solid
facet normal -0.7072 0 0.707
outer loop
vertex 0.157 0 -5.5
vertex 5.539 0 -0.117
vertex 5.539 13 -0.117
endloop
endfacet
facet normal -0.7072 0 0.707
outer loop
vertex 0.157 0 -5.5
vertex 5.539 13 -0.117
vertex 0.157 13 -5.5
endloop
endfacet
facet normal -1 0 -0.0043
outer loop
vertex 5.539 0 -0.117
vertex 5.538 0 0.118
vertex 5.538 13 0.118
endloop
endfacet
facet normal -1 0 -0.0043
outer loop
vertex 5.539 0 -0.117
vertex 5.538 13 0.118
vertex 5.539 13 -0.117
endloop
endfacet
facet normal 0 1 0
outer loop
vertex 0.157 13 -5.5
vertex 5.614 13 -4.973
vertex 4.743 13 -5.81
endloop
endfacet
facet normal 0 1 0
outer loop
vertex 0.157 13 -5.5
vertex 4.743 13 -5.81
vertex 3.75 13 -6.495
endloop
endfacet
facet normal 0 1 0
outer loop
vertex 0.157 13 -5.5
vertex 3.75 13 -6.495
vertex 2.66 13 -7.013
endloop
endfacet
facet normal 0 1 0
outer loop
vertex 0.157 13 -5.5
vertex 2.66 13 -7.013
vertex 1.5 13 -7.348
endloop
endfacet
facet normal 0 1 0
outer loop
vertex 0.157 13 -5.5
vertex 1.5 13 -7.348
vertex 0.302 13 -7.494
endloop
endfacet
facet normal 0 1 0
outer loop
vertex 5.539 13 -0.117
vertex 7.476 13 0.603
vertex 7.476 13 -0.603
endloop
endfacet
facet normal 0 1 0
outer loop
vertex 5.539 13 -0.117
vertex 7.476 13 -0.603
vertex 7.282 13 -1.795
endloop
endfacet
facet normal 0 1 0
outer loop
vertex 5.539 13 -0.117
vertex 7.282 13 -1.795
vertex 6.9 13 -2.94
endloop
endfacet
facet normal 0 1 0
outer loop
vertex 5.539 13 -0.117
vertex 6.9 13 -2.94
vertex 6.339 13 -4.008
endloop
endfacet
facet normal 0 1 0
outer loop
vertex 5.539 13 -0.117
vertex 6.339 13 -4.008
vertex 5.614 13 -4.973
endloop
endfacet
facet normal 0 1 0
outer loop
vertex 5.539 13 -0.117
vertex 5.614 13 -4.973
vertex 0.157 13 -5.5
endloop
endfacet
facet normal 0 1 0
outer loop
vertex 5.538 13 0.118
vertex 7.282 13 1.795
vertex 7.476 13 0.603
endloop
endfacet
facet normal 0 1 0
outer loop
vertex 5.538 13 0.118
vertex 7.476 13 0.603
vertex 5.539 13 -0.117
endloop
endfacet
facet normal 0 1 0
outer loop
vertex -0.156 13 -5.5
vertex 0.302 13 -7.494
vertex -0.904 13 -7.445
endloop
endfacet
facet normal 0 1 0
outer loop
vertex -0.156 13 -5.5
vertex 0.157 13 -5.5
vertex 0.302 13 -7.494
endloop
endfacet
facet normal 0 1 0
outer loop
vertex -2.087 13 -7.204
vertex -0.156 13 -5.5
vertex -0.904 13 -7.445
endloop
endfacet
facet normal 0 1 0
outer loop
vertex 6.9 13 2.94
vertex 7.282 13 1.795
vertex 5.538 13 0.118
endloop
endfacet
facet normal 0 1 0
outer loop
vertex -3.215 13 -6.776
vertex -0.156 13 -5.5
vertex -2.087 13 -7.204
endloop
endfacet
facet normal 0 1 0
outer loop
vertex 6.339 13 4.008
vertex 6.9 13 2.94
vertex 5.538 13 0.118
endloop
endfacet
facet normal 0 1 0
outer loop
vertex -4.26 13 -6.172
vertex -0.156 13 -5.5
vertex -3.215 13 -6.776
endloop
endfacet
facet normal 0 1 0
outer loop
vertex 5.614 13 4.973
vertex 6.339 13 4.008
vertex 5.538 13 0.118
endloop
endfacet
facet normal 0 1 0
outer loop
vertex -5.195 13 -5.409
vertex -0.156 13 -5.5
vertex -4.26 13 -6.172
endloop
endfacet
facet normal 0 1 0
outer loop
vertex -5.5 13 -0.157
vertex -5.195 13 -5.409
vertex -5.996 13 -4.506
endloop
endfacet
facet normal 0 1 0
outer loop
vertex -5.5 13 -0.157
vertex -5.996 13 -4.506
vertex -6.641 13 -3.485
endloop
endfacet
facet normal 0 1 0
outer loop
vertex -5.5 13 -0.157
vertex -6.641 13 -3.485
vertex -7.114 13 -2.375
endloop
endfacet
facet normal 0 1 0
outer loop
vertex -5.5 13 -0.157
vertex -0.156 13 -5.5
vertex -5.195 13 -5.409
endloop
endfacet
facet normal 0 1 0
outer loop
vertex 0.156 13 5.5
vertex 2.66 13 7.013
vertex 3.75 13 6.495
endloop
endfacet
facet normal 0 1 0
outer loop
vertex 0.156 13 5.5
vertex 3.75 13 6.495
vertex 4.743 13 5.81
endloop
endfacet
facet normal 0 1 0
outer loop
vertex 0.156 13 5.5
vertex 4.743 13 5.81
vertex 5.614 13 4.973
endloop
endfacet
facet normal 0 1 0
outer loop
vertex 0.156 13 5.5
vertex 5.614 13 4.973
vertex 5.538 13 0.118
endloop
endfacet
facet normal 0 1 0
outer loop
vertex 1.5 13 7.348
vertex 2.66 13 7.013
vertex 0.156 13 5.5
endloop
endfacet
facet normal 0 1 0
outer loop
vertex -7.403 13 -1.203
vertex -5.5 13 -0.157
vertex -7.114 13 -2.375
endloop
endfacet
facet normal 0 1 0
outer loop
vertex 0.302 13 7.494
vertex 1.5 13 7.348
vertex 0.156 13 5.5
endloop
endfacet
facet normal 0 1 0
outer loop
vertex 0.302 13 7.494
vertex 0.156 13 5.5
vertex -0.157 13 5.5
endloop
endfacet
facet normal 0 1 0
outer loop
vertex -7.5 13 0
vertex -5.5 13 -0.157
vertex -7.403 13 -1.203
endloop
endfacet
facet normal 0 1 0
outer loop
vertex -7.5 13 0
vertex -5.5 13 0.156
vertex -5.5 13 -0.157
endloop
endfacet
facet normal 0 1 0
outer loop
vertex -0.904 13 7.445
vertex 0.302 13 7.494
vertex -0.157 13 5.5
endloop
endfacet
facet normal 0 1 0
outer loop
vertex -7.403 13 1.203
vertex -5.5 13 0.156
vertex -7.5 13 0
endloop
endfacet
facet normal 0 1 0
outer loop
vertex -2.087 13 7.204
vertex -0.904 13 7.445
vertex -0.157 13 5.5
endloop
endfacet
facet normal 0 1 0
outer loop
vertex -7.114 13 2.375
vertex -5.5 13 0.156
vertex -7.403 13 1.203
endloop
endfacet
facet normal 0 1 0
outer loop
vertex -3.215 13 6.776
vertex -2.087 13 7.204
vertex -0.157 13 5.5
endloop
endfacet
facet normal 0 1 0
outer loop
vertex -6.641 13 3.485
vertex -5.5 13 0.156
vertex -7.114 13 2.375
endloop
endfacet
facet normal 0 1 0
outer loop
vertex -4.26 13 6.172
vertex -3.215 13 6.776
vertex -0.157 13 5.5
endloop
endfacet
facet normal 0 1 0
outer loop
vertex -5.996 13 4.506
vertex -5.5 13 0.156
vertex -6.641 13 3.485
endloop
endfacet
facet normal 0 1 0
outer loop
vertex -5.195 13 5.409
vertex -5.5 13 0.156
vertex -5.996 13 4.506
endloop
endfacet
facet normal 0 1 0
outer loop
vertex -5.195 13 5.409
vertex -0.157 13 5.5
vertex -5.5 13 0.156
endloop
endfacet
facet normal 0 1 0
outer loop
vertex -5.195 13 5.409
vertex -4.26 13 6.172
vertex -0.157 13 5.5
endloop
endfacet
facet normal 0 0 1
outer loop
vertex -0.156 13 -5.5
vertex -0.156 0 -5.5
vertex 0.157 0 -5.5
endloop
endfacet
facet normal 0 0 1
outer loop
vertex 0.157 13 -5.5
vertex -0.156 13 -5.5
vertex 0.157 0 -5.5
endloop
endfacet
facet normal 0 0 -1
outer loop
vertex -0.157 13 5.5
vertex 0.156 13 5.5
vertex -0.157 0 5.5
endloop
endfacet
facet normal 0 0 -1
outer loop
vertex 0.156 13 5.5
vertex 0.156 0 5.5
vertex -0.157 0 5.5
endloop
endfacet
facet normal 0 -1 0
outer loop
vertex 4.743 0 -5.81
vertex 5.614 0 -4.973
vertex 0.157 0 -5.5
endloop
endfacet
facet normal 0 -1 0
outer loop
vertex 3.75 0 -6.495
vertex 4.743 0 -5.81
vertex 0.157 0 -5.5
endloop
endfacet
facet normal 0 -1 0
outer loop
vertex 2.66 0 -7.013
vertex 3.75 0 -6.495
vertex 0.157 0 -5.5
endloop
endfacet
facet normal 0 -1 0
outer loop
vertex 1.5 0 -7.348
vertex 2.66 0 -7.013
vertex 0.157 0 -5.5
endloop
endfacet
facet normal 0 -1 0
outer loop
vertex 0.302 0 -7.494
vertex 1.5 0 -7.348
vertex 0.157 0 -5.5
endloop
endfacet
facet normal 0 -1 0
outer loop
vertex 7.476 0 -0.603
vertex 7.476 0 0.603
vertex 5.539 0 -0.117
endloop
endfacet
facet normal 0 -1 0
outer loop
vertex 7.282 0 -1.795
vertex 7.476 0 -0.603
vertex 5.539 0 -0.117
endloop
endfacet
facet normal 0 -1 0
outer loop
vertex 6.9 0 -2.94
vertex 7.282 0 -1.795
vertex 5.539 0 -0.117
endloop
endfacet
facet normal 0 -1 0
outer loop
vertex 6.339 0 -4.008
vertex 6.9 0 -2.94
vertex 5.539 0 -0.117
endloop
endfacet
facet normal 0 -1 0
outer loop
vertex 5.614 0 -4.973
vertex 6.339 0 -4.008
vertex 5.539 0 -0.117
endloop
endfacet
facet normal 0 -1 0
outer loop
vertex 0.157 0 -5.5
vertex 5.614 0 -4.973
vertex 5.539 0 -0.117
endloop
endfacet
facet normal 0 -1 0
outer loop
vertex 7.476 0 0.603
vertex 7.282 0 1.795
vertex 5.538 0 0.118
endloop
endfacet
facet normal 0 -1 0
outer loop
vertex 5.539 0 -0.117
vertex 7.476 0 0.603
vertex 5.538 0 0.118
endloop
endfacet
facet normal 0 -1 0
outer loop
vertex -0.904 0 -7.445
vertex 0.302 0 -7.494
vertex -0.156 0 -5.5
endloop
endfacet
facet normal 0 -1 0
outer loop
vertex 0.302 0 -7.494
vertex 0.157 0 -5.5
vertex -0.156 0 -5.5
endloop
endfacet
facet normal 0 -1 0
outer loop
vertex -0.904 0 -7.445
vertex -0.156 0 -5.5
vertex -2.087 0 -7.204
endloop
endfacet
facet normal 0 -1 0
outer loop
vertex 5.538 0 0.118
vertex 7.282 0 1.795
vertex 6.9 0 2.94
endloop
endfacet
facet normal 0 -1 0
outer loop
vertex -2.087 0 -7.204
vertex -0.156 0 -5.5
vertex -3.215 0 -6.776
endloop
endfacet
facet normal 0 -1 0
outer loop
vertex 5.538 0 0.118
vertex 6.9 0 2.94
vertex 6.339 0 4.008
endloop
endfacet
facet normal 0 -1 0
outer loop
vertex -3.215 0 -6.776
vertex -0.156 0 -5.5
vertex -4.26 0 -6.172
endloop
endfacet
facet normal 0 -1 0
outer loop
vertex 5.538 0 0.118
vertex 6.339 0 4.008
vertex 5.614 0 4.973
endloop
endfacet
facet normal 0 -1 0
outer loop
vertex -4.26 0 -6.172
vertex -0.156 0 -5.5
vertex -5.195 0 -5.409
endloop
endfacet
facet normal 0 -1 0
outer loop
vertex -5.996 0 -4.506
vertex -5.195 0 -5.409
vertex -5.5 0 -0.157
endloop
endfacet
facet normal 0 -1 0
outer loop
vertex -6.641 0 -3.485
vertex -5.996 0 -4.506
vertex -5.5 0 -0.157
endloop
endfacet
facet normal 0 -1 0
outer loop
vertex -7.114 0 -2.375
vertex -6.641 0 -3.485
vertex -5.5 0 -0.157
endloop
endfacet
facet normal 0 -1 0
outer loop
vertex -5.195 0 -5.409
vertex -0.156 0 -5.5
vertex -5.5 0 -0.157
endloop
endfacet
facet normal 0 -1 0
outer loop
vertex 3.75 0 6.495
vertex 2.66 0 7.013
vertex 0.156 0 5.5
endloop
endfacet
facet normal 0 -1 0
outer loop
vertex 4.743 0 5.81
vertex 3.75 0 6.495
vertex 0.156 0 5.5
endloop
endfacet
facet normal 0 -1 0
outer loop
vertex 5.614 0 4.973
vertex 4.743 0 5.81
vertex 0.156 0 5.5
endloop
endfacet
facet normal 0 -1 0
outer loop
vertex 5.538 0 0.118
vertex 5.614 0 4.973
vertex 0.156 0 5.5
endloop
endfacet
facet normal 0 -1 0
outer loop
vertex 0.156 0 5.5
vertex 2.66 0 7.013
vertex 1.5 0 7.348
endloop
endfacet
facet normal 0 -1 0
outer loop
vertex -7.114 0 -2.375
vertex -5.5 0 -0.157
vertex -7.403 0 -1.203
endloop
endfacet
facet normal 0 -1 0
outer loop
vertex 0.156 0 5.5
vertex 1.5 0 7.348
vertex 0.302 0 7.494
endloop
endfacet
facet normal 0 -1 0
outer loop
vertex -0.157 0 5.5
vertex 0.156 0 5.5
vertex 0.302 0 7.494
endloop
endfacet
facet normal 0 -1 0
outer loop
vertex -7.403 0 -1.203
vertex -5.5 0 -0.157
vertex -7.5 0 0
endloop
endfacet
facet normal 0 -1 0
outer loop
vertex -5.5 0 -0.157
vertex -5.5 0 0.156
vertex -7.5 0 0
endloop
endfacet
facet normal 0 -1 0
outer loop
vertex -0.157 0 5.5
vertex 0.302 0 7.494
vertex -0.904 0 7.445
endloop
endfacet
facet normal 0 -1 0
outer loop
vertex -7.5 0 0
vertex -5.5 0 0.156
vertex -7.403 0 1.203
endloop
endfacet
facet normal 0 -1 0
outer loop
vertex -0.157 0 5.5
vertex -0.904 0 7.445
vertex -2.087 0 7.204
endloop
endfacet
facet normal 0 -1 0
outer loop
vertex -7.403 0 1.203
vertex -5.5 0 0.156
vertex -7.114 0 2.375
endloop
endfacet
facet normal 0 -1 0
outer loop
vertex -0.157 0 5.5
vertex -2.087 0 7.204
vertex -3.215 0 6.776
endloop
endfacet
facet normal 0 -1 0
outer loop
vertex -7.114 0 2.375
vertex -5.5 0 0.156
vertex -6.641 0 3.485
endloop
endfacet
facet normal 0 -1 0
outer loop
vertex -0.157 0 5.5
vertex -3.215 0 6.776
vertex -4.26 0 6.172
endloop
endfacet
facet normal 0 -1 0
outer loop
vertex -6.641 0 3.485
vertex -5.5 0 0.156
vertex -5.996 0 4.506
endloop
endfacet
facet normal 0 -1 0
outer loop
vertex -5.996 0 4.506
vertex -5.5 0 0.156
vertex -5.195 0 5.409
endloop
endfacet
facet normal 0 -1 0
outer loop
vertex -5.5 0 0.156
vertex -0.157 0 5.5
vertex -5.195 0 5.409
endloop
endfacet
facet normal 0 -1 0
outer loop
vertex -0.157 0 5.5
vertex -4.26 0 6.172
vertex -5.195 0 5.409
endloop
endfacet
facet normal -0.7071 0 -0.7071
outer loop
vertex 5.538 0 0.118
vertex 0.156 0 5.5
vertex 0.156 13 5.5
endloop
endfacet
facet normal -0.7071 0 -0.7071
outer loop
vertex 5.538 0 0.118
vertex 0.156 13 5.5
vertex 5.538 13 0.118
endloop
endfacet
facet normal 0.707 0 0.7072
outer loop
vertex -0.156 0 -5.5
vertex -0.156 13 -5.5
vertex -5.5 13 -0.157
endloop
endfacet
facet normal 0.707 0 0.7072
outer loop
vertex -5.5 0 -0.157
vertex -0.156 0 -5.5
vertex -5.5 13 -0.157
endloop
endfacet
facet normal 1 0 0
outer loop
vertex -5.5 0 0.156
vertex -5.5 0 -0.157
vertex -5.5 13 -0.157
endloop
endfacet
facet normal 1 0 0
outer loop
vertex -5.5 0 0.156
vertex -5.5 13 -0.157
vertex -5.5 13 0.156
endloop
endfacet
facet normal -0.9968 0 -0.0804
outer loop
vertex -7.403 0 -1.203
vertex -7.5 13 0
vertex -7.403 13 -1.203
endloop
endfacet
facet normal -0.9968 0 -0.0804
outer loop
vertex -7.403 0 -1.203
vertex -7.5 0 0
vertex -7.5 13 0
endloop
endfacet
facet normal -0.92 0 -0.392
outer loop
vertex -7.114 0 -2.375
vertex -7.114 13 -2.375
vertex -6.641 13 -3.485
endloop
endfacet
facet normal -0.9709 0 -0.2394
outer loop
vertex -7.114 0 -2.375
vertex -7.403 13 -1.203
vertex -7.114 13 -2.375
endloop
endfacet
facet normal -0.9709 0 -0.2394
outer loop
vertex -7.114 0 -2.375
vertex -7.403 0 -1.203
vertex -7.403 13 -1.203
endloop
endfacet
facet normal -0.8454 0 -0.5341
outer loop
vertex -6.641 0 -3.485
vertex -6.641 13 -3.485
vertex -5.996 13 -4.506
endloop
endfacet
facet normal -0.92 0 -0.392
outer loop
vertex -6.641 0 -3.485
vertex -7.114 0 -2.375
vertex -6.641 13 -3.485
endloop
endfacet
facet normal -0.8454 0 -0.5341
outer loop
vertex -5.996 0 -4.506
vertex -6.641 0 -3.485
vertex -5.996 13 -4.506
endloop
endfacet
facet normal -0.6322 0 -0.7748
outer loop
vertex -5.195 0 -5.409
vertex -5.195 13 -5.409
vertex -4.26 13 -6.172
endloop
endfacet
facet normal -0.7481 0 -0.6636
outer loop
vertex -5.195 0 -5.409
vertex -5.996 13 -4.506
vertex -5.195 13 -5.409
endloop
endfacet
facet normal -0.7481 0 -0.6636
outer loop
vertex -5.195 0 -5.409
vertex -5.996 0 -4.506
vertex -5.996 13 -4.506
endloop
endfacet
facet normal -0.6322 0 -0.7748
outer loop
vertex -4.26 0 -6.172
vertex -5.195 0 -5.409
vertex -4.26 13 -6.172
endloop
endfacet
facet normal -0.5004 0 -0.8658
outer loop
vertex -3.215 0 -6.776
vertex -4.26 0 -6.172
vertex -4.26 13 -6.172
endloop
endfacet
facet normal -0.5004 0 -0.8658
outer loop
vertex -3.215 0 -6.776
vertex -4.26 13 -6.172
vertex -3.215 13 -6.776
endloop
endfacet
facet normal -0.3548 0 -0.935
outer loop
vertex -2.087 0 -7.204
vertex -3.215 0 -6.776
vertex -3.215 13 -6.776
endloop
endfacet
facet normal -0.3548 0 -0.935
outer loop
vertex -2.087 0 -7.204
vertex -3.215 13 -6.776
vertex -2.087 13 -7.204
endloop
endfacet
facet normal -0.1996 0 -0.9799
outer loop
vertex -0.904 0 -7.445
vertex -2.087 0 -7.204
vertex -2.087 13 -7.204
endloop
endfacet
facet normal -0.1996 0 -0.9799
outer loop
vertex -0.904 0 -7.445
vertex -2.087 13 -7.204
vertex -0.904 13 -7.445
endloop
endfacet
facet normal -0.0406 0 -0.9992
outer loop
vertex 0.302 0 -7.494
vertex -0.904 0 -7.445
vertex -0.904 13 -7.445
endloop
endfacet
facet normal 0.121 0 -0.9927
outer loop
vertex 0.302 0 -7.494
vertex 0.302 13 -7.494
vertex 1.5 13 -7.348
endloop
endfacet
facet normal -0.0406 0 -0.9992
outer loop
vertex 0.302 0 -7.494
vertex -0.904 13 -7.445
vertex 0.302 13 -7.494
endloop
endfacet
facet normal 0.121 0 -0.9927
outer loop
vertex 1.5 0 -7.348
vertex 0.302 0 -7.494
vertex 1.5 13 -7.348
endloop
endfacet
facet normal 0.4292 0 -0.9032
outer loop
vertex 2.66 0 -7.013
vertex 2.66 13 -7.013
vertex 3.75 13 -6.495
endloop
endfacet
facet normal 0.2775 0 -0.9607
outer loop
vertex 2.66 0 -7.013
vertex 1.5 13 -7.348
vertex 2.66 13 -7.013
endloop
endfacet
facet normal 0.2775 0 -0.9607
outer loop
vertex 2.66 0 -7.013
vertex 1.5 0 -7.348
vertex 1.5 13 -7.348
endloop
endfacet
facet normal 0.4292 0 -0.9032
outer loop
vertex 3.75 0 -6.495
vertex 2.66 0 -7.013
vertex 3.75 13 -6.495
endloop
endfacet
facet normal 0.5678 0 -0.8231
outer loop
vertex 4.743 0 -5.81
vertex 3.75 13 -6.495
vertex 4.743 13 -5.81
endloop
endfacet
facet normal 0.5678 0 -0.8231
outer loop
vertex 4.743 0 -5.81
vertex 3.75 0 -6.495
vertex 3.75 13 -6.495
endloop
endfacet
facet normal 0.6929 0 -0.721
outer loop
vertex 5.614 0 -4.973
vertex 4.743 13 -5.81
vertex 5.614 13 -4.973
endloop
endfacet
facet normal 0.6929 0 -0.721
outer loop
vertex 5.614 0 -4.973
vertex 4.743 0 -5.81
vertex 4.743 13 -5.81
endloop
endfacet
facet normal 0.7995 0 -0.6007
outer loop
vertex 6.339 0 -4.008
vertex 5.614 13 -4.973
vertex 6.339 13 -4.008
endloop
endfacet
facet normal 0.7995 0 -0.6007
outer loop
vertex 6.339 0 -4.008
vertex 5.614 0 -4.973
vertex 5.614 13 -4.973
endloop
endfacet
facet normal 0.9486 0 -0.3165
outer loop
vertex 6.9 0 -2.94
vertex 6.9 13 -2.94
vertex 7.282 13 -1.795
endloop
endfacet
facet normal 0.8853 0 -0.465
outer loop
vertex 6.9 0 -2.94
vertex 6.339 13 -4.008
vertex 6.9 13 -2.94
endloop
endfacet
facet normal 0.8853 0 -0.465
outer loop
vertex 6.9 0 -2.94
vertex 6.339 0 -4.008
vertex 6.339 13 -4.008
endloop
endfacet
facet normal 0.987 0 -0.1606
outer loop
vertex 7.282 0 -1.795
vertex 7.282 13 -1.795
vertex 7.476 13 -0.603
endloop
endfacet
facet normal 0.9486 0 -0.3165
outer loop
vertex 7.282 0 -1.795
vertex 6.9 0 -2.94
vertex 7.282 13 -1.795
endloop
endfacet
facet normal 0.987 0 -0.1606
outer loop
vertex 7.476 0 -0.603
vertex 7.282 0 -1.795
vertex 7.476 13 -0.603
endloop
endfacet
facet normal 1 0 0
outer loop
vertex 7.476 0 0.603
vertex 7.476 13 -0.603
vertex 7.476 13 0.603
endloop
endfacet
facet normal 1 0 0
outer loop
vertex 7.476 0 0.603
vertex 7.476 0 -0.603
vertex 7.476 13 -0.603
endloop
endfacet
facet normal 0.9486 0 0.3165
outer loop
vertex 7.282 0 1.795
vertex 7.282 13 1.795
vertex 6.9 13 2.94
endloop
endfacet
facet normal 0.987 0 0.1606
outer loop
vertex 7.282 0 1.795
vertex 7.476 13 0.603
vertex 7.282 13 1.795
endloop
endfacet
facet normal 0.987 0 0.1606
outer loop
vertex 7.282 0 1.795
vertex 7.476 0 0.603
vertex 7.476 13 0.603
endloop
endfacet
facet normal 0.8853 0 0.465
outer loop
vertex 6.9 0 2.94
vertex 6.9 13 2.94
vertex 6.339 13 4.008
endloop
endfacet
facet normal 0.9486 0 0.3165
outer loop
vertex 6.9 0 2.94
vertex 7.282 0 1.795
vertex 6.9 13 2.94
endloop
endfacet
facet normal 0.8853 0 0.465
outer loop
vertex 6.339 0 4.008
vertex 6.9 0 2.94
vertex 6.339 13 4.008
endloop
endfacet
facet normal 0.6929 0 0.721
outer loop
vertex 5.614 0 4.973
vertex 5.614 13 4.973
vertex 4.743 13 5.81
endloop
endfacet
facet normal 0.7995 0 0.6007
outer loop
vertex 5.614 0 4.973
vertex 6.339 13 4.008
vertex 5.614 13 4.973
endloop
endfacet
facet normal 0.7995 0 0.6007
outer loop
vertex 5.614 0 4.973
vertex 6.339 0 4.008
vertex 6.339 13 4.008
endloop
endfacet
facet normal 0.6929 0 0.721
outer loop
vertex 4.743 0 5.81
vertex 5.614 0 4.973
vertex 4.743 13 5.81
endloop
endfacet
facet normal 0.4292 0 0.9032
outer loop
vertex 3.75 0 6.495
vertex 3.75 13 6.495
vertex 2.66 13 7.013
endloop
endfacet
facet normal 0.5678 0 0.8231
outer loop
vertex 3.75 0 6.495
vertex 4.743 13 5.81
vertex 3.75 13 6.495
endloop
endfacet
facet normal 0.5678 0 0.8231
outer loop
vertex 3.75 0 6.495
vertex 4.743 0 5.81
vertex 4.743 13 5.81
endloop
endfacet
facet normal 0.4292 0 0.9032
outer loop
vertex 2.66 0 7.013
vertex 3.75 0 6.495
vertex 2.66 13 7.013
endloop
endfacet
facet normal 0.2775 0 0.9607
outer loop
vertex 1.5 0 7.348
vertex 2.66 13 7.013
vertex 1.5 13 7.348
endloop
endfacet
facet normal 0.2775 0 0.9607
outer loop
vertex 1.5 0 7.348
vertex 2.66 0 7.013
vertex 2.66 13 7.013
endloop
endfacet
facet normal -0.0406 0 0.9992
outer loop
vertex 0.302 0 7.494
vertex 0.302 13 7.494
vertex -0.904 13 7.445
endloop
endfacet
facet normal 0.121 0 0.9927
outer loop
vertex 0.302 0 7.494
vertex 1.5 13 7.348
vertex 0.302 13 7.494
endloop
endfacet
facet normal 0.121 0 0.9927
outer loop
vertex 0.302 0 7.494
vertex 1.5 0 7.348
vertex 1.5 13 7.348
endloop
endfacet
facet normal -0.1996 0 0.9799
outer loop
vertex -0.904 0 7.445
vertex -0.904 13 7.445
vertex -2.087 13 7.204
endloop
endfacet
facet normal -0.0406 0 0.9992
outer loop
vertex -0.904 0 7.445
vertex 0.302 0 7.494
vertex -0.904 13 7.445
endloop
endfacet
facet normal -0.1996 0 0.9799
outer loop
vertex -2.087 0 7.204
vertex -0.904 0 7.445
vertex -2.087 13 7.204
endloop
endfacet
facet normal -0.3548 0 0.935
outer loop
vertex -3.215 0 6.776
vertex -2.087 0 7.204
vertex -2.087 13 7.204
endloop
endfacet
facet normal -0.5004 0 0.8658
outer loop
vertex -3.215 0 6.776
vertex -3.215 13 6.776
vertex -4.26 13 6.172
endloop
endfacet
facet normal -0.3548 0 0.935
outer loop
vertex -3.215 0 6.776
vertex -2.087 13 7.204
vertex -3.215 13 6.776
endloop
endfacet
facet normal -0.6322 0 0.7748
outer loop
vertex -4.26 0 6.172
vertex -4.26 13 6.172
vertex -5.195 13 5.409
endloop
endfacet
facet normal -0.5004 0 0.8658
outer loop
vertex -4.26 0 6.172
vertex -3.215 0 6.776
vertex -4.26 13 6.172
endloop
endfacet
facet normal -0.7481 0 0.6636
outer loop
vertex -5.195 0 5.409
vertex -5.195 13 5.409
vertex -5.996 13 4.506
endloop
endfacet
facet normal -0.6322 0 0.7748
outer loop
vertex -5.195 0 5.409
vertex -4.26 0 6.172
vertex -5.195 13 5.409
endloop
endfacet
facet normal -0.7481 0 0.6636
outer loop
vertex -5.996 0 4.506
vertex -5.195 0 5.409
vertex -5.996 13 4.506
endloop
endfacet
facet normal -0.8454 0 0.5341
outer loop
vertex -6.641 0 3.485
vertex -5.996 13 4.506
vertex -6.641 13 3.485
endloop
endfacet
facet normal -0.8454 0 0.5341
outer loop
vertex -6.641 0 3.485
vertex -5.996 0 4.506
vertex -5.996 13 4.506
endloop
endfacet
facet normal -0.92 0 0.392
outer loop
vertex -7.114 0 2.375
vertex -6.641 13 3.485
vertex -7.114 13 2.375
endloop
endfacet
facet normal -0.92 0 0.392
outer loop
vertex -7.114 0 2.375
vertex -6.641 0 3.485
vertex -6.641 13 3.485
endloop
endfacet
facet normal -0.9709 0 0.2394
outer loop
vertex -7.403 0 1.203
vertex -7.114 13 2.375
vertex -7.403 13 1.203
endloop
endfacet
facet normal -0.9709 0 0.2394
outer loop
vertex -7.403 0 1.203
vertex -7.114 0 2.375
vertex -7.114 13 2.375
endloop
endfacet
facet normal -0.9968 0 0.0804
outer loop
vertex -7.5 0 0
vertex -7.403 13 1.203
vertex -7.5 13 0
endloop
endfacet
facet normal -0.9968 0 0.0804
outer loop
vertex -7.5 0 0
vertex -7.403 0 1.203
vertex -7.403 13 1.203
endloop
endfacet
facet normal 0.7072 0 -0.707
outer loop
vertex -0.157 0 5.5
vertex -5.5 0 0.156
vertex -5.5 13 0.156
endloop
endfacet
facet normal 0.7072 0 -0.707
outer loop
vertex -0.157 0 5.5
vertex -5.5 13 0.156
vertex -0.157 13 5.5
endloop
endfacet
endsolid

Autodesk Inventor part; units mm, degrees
ref_plane "YZ Plane" through (0, 0, 0) normal (1, 0, 0) x (0, 1, 0)
ref_plane "XZ Plane" through (0, 0, 0) normal (0, 1, 0) x (-1, 0, 0)
ref_plane "XY Plane" through (0, 0, 0) normal (0, 0, 1) x (1, 0, 0)
sketch "Эскиз1" plane through (0, 0, 0) normal (0, 1, 0) x (-1, 0, 0)
  line L0 (-0.1311, -5.5) -> (-5.5, -0.1311)
  line L1 (-5.5, 0.1311) -> (-0.1311, 5.5)
  line L2 (0.1311, 5.5) -> (5.5001, 0.131)
  line L3 (5.5001, -0.131) -> (0.1311, -5.5)
  line L4 (-5.5, 0.131) -> (-5.5, -0.1311)
  line L5 (5.5001, 0.131) -> (5.5001, -0.131)
  line L6 (-0.131, 5.5) -> (0.1311, 5.5)
  line L7 (0.1311, -5.5) -> (-0.1311, -5.5)
  circle A0 centre (0, 0) radius 7.5
extrude "Выдавливание1" add sketch "Эскиз1" along normal blind 13 contours L0 L4 L1 L6 L2 L5 L3 L7 | A0
sketch "Эскиз2" plane through (0, 0, 0) normal (0, -1, 0) x (1, 0, 0)
  circle A0 centre (0, 0) radius 7.5 projected
  line L0 (0.1555, 5.5004) -> (5.5383, 0.1184)
  line L1 (5.5386, -0.1173) -> (0.1571, -5.4996)
  line L2 (-0.156, -5.4999) -> (-5.4995, -0.1573)
  line L3 (-5.4998, 0.1561) -> (-0.0021, 5.6547)
  line L4 (5.5383, 0.1184) -> (5.5386, -0.1173)
  line L5 (-5.4995, -0.1573) -> (-5.4998, 0.1561)
  line L6 (0.1555, 5.5004) -> (-0.1567, 5.5001)
  line L7 (-0.156, -5.4999) -> (0.1571, -5.4996)
  dimension "d4" = 8
  dimension "d5" = 11
extrude "Выдавливание2" cut sketch "Эскиз2" against normal blind 13 contours L0 L4 L1 L7 L2 L5 L3 L6
